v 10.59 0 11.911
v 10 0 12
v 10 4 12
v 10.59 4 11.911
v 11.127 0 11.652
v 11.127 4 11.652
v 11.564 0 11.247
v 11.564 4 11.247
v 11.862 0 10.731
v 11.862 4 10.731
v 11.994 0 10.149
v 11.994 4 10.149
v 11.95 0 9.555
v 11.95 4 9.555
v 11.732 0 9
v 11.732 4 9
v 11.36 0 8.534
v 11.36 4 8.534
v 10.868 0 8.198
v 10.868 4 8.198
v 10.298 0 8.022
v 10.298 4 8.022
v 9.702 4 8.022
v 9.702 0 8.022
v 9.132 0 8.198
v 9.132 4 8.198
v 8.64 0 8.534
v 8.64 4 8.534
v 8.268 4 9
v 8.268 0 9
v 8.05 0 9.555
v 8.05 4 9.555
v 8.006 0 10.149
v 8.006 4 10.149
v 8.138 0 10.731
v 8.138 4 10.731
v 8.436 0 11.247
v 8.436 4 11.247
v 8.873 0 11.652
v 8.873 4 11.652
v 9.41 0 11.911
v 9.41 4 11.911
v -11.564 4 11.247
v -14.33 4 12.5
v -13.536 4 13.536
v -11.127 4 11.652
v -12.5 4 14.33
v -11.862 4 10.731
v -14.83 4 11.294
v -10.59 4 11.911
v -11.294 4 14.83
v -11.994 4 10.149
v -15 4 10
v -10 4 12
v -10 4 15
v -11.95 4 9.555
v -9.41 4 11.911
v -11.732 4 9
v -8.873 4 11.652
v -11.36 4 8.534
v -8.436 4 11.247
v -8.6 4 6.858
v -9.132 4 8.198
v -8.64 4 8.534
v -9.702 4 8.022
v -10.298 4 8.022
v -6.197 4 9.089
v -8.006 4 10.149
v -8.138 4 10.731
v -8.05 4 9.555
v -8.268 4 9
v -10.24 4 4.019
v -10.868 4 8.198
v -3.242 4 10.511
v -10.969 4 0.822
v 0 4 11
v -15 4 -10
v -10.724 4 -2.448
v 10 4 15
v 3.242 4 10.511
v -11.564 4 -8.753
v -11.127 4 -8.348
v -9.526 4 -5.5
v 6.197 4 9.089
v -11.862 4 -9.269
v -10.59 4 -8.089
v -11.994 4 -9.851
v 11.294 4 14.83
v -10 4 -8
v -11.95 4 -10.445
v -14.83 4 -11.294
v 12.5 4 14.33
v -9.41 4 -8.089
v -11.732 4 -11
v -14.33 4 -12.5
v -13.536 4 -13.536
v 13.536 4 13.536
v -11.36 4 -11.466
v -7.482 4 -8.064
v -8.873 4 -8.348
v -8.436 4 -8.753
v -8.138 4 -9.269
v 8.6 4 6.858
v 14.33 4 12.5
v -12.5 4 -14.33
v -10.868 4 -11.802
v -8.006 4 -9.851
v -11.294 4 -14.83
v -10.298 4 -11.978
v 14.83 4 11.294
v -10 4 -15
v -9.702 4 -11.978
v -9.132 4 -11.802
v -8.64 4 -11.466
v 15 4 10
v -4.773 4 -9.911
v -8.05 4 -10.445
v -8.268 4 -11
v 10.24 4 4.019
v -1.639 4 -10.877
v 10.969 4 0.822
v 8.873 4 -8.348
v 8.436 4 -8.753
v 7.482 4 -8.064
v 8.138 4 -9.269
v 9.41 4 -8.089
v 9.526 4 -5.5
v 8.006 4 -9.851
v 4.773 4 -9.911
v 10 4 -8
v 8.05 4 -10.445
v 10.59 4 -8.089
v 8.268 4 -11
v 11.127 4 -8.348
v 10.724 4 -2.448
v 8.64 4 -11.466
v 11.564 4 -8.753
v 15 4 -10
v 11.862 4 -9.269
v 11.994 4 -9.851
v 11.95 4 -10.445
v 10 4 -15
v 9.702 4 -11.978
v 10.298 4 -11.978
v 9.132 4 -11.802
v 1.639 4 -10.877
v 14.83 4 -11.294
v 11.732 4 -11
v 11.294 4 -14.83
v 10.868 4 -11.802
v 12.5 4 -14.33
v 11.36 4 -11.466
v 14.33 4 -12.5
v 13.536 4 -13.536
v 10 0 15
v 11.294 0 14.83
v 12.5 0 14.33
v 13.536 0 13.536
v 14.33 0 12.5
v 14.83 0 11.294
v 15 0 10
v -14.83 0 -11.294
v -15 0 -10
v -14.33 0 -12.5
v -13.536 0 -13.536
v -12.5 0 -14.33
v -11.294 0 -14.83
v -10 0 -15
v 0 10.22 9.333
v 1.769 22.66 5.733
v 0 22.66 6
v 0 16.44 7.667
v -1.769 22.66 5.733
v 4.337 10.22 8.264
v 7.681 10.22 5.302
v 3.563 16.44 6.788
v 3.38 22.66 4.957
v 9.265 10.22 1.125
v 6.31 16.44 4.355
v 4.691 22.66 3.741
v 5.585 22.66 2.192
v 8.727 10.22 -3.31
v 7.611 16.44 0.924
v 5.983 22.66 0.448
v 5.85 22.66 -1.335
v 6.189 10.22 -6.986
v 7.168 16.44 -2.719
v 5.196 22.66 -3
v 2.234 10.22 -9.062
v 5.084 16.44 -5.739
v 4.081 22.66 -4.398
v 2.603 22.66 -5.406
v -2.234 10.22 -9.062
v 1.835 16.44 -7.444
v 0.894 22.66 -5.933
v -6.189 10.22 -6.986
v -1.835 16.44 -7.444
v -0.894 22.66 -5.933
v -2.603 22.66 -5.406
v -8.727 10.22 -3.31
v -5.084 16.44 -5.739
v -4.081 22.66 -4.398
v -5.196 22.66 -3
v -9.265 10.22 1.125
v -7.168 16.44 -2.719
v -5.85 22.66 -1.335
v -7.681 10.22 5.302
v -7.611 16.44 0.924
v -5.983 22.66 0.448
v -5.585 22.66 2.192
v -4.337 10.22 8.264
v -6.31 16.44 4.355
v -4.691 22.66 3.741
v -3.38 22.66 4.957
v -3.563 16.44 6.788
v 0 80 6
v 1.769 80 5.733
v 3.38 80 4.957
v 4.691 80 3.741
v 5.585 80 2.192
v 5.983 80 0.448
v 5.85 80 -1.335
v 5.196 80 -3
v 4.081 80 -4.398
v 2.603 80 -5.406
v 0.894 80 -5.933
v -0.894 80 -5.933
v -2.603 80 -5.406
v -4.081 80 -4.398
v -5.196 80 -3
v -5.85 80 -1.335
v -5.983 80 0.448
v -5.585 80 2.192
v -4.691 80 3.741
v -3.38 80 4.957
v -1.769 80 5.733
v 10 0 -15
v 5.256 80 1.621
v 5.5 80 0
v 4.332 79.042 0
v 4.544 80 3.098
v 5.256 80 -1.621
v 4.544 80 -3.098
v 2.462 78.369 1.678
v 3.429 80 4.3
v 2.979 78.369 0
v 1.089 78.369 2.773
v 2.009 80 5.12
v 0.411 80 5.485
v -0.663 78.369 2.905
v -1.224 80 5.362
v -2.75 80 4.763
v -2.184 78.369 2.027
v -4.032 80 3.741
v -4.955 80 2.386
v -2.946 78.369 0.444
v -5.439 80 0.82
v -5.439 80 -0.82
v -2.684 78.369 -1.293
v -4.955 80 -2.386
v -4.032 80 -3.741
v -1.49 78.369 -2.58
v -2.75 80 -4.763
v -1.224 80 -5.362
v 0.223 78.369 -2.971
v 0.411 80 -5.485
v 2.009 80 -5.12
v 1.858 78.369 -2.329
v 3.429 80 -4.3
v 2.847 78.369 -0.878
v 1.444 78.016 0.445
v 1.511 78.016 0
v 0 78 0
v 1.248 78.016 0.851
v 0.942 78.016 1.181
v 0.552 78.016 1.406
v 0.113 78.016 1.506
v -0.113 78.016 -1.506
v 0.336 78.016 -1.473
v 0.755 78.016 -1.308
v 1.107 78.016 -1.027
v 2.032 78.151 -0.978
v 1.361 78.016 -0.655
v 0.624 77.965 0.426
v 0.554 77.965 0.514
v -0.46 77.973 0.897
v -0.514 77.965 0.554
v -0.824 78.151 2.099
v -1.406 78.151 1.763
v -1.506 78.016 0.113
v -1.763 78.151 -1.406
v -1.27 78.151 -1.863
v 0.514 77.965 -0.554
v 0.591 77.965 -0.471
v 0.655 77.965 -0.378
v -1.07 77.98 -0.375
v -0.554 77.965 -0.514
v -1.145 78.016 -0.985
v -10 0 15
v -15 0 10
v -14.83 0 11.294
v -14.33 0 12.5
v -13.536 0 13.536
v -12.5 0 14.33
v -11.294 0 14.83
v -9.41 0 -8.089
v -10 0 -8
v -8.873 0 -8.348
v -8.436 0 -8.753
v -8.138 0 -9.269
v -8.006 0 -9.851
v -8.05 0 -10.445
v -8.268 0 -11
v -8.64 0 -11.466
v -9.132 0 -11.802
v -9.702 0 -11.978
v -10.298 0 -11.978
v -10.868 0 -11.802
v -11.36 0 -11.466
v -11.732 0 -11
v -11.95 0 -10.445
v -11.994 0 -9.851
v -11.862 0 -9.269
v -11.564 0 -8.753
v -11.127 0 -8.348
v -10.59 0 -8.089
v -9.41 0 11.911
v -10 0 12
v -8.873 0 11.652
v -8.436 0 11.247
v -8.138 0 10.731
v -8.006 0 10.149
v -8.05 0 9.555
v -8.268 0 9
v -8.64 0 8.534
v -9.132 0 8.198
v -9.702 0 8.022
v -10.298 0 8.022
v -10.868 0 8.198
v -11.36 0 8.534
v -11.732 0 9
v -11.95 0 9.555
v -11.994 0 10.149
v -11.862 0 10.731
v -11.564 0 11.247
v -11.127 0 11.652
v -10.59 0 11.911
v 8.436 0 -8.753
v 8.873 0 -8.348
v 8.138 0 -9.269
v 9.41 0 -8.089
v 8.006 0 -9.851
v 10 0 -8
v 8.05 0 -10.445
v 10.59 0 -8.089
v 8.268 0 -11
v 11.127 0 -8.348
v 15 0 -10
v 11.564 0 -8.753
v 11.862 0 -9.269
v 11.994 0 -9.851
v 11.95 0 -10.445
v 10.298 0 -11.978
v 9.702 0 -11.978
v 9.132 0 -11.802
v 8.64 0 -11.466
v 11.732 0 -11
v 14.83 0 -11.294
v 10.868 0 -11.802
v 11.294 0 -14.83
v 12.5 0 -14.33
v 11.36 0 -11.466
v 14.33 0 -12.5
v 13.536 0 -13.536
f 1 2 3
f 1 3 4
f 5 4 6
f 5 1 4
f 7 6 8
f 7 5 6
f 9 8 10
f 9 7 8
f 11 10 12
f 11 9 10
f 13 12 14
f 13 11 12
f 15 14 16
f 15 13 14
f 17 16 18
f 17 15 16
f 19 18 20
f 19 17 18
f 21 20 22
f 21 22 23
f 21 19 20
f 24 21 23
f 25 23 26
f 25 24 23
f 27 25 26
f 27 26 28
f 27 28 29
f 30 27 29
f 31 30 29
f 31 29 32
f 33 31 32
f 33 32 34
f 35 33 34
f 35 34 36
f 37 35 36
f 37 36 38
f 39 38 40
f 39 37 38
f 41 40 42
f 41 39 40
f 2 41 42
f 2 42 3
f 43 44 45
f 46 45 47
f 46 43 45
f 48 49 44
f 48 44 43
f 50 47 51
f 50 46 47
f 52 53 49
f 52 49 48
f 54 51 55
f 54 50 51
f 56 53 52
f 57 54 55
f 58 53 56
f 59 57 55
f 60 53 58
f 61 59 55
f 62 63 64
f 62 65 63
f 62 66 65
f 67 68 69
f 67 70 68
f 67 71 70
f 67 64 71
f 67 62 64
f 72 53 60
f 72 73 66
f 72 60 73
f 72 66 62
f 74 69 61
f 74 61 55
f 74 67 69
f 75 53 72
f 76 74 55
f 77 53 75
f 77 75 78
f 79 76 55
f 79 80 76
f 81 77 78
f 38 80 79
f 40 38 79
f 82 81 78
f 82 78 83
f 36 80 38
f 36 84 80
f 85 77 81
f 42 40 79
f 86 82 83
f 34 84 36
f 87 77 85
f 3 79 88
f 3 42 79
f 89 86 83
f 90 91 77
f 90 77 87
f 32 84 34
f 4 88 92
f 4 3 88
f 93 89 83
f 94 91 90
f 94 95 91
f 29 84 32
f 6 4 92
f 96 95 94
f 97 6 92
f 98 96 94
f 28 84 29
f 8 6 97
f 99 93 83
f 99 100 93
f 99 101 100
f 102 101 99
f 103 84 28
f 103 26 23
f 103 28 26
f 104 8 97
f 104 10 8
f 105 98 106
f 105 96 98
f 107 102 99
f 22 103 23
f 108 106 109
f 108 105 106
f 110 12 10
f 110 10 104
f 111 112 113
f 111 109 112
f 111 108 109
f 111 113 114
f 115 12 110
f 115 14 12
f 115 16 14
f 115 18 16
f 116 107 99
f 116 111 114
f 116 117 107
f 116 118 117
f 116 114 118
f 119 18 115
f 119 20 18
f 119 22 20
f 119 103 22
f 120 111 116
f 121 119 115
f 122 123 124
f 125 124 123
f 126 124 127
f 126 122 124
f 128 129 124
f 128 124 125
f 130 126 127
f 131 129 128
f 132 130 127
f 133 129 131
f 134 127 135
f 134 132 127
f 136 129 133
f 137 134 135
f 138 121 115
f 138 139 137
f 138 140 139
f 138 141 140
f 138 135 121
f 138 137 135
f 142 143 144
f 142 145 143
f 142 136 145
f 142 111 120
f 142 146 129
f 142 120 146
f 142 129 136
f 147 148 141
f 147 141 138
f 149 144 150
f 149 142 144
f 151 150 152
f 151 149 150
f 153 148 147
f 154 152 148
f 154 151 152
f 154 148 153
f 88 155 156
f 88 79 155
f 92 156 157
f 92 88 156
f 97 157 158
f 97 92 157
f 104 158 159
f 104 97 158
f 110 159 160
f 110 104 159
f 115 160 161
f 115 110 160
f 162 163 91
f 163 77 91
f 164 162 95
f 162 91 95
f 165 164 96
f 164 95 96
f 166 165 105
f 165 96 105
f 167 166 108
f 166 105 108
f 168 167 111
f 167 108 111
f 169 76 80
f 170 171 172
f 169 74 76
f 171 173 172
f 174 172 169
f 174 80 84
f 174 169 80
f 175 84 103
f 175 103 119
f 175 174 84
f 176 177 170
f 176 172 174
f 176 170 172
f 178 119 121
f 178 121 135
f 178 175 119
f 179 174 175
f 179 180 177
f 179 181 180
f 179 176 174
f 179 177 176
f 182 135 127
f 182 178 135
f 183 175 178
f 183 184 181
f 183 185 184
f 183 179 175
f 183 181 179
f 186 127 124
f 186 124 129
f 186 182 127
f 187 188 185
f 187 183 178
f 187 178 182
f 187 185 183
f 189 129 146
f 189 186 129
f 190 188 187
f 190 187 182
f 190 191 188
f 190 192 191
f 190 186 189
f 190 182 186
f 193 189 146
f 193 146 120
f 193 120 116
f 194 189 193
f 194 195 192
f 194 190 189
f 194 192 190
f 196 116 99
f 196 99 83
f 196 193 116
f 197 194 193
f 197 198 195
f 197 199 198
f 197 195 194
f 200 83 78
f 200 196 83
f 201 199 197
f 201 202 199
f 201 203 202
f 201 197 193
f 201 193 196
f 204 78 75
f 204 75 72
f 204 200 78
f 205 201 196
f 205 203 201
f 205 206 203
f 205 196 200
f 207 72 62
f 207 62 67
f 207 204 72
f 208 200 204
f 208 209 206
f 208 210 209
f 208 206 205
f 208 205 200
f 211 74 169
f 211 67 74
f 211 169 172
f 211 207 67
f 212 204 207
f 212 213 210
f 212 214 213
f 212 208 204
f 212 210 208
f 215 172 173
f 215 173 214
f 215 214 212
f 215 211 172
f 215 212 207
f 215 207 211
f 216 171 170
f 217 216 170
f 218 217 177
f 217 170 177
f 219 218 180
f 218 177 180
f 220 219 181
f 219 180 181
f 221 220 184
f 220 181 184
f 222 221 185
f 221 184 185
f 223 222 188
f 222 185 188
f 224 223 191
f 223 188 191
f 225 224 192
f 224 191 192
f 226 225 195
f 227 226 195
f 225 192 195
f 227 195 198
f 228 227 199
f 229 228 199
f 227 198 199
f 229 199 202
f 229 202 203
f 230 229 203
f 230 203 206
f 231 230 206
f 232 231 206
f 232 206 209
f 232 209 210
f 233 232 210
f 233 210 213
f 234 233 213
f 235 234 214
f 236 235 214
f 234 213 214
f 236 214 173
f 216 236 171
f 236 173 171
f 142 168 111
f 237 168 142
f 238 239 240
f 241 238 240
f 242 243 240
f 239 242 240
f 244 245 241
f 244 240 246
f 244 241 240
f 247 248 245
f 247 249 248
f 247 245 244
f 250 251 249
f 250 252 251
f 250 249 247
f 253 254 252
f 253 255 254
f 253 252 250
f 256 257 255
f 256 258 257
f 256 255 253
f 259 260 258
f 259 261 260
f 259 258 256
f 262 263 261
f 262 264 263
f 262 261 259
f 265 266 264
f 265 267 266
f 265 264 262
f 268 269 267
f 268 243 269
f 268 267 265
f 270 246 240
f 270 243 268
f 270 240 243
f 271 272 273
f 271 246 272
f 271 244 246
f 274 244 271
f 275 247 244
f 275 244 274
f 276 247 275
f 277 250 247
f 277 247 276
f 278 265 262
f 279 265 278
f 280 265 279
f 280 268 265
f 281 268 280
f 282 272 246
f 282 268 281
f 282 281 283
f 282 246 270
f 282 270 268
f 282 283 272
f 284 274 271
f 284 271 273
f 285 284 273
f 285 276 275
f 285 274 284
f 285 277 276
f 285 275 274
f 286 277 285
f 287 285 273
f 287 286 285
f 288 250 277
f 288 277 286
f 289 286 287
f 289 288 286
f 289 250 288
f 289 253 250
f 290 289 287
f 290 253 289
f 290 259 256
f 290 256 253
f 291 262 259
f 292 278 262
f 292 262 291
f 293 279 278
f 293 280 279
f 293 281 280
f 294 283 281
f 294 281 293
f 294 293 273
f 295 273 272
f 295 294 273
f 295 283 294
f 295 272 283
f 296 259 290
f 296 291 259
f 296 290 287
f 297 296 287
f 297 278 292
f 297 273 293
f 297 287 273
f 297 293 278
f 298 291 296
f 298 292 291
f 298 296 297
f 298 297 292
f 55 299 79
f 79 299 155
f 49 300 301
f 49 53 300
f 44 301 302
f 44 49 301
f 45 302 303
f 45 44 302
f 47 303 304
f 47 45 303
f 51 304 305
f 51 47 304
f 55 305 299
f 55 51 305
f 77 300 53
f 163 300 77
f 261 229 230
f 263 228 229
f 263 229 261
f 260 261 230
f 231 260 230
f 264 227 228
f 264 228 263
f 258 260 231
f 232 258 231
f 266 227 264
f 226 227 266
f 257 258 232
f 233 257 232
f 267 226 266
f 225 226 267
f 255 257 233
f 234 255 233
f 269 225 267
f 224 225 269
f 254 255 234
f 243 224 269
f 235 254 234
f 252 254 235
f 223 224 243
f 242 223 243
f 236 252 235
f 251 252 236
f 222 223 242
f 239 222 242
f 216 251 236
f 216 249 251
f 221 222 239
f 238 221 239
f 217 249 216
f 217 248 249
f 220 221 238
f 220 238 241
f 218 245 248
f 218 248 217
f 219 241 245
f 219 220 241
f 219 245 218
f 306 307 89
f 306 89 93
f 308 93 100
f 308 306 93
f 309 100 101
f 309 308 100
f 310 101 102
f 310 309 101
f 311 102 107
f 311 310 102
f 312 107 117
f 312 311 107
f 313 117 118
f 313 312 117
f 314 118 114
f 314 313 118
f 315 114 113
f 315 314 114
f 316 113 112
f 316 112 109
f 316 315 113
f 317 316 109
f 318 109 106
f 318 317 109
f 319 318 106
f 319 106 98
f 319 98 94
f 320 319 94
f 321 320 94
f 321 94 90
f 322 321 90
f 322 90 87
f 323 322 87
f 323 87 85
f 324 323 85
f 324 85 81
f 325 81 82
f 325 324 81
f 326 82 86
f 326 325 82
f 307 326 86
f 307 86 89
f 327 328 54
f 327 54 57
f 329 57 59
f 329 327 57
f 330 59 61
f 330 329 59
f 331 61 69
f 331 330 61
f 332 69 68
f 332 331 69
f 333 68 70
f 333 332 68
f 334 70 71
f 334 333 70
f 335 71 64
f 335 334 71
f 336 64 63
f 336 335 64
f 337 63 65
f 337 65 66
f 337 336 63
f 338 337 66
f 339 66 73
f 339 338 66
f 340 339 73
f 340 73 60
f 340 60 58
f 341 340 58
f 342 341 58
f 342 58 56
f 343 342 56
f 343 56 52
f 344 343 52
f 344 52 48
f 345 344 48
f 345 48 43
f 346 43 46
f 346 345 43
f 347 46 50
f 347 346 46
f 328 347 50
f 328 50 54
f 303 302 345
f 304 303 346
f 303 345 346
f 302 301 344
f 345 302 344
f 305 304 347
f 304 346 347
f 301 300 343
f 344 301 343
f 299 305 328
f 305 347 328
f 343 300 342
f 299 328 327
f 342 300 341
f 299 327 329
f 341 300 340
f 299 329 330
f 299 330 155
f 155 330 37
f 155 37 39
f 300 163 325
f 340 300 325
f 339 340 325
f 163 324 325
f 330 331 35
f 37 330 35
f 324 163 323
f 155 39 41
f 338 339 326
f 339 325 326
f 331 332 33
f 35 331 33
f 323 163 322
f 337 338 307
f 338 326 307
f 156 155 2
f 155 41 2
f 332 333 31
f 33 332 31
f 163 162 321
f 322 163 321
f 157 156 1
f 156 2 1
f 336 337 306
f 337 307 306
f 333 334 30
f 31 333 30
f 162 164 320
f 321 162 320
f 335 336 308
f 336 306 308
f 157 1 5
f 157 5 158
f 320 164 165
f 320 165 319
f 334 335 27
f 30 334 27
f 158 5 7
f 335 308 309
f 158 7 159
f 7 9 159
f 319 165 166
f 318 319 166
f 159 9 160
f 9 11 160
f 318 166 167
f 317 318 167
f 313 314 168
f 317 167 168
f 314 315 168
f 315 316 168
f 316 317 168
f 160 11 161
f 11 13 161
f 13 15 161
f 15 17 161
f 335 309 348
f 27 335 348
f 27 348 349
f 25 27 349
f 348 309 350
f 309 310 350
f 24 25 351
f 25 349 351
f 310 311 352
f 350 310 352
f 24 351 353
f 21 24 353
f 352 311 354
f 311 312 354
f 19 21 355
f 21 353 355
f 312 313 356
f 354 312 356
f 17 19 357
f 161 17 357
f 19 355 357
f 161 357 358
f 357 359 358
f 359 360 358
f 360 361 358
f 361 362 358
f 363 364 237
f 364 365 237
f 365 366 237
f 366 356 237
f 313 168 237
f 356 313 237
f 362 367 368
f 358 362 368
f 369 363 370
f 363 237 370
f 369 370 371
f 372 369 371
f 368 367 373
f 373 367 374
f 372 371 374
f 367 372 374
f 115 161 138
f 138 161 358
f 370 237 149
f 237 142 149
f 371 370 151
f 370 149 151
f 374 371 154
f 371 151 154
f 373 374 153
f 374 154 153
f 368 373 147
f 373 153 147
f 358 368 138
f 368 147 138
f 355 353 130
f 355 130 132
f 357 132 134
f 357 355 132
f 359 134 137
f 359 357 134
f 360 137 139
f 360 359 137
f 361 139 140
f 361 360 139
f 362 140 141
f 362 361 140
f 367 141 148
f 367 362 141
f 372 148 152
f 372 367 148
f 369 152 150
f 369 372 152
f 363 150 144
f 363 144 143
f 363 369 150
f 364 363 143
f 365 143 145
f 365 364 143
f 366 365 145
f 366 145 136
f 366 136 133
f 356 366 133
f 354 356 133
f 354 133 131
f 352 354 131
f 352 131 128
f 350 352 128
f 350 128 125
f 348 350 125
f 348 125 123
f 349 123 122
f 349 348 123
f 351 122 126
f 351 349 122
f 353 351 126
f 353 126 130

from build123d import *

# Parameters (mm, degrees)
SKETCH_1_W      = 30
SKETCH_1_H      = 30
SKETCH_1_R      = 2
EXTRUDE_1_DEPTH = 4
FILLET_1_R      = 5
SKETCH_2_R      = 6
EXTRUDE_2_DEPTH = 76
CHAMFER_1_SIZE  = 5
CHAMFER_1_SIZE2 = 18.660254038


with BuildPart() as part:
    # Эскиз1 → Бобышка-Вытянуть1 (new body)
    with BuildSketch(Plane(origin=(0, 0, 0), x_dir=(1, 0, 0), z_dir=(0, 1, 0))):
        Rectangle(SKETCH_1_W, SKETCH_1_H)
        with Locations(Location((-10, 10, 0), (0, 0, 270))):
            Circle(SKETCH_1_R, mode=Mode.SUBTRACT)
        with Locations(Location((10, 10, 0), (0, 0, 270))):
            Circle(SKETCH_1_R, mode=Mode.SUBTRACT)
        with Locations(Location((10, -10, 0), (0, 0, 270))):
            Circle(SKETCH_1_R, mode=Mode.SUBTRACT)
        with Locations(Location((-10, -10, 0), (0, 0, 270))):
            Circle(SKETCH_1_R, mode=Mode.SUBTRACT)
    extrude(amount=EXTRUDE_1_DEPTH)

    # Скругление1
    fillet_1_edges = [part.edges().sort_by_distance(p)[0] for p in [
        (15, 2, 15),
        (-15, 2, 15),
        (-15, 2, -15),
        (15, 2, -15),
    ]]
    fillet(fillet_1_edges, radius=FILLET_1_R)

    # Эскиз2 → Бобышка-Вытянуть2 (add)
    with BuildSketch(Plane(origin=(0, 4, 0), x_dir=(1, 0, 0), z_dir=(0, 1, 0))):
        with Locations(Location((0, 0, 0), (0, 0, 270))):
            Circle(SKETCH_2_R)
    extrude(amount=EXTRUDE_2_DEPTH)

    # Эскиз7 → Вырез-Повернуть3 (revolve, cut)
    with BuildSketch(Plane.XY):
        with BuildLine():
            Line((5.5, 80), (0, 80))
            Line((0, 80), (0, 78))
            ThreePointArc((0, 78), (2.979435889, 78.369051304), (5.5, 80))
        make_face()
    revolve(axis=Axis((0, 82.404747685, 0), (0, -1, 0)), mode=Mode.SUBTRACT)

    # Фаска1
    chamfer_1_edges = [part.edges().sort_by_distance(p)[0] for p in [
        (0, 4, -6),
    ]]
    chamfer_1_side = [part.faces().sort_by_distance(p)[0] for p in [
        (0, 4, 14.575735931),
    ]]
    chamfer(chamfer_1_edges, length=CHAMFER_1_SIZE, length2=CHAMFER_1_SIZE2, reference=chamfer_1_side[0])


solid = part.part
